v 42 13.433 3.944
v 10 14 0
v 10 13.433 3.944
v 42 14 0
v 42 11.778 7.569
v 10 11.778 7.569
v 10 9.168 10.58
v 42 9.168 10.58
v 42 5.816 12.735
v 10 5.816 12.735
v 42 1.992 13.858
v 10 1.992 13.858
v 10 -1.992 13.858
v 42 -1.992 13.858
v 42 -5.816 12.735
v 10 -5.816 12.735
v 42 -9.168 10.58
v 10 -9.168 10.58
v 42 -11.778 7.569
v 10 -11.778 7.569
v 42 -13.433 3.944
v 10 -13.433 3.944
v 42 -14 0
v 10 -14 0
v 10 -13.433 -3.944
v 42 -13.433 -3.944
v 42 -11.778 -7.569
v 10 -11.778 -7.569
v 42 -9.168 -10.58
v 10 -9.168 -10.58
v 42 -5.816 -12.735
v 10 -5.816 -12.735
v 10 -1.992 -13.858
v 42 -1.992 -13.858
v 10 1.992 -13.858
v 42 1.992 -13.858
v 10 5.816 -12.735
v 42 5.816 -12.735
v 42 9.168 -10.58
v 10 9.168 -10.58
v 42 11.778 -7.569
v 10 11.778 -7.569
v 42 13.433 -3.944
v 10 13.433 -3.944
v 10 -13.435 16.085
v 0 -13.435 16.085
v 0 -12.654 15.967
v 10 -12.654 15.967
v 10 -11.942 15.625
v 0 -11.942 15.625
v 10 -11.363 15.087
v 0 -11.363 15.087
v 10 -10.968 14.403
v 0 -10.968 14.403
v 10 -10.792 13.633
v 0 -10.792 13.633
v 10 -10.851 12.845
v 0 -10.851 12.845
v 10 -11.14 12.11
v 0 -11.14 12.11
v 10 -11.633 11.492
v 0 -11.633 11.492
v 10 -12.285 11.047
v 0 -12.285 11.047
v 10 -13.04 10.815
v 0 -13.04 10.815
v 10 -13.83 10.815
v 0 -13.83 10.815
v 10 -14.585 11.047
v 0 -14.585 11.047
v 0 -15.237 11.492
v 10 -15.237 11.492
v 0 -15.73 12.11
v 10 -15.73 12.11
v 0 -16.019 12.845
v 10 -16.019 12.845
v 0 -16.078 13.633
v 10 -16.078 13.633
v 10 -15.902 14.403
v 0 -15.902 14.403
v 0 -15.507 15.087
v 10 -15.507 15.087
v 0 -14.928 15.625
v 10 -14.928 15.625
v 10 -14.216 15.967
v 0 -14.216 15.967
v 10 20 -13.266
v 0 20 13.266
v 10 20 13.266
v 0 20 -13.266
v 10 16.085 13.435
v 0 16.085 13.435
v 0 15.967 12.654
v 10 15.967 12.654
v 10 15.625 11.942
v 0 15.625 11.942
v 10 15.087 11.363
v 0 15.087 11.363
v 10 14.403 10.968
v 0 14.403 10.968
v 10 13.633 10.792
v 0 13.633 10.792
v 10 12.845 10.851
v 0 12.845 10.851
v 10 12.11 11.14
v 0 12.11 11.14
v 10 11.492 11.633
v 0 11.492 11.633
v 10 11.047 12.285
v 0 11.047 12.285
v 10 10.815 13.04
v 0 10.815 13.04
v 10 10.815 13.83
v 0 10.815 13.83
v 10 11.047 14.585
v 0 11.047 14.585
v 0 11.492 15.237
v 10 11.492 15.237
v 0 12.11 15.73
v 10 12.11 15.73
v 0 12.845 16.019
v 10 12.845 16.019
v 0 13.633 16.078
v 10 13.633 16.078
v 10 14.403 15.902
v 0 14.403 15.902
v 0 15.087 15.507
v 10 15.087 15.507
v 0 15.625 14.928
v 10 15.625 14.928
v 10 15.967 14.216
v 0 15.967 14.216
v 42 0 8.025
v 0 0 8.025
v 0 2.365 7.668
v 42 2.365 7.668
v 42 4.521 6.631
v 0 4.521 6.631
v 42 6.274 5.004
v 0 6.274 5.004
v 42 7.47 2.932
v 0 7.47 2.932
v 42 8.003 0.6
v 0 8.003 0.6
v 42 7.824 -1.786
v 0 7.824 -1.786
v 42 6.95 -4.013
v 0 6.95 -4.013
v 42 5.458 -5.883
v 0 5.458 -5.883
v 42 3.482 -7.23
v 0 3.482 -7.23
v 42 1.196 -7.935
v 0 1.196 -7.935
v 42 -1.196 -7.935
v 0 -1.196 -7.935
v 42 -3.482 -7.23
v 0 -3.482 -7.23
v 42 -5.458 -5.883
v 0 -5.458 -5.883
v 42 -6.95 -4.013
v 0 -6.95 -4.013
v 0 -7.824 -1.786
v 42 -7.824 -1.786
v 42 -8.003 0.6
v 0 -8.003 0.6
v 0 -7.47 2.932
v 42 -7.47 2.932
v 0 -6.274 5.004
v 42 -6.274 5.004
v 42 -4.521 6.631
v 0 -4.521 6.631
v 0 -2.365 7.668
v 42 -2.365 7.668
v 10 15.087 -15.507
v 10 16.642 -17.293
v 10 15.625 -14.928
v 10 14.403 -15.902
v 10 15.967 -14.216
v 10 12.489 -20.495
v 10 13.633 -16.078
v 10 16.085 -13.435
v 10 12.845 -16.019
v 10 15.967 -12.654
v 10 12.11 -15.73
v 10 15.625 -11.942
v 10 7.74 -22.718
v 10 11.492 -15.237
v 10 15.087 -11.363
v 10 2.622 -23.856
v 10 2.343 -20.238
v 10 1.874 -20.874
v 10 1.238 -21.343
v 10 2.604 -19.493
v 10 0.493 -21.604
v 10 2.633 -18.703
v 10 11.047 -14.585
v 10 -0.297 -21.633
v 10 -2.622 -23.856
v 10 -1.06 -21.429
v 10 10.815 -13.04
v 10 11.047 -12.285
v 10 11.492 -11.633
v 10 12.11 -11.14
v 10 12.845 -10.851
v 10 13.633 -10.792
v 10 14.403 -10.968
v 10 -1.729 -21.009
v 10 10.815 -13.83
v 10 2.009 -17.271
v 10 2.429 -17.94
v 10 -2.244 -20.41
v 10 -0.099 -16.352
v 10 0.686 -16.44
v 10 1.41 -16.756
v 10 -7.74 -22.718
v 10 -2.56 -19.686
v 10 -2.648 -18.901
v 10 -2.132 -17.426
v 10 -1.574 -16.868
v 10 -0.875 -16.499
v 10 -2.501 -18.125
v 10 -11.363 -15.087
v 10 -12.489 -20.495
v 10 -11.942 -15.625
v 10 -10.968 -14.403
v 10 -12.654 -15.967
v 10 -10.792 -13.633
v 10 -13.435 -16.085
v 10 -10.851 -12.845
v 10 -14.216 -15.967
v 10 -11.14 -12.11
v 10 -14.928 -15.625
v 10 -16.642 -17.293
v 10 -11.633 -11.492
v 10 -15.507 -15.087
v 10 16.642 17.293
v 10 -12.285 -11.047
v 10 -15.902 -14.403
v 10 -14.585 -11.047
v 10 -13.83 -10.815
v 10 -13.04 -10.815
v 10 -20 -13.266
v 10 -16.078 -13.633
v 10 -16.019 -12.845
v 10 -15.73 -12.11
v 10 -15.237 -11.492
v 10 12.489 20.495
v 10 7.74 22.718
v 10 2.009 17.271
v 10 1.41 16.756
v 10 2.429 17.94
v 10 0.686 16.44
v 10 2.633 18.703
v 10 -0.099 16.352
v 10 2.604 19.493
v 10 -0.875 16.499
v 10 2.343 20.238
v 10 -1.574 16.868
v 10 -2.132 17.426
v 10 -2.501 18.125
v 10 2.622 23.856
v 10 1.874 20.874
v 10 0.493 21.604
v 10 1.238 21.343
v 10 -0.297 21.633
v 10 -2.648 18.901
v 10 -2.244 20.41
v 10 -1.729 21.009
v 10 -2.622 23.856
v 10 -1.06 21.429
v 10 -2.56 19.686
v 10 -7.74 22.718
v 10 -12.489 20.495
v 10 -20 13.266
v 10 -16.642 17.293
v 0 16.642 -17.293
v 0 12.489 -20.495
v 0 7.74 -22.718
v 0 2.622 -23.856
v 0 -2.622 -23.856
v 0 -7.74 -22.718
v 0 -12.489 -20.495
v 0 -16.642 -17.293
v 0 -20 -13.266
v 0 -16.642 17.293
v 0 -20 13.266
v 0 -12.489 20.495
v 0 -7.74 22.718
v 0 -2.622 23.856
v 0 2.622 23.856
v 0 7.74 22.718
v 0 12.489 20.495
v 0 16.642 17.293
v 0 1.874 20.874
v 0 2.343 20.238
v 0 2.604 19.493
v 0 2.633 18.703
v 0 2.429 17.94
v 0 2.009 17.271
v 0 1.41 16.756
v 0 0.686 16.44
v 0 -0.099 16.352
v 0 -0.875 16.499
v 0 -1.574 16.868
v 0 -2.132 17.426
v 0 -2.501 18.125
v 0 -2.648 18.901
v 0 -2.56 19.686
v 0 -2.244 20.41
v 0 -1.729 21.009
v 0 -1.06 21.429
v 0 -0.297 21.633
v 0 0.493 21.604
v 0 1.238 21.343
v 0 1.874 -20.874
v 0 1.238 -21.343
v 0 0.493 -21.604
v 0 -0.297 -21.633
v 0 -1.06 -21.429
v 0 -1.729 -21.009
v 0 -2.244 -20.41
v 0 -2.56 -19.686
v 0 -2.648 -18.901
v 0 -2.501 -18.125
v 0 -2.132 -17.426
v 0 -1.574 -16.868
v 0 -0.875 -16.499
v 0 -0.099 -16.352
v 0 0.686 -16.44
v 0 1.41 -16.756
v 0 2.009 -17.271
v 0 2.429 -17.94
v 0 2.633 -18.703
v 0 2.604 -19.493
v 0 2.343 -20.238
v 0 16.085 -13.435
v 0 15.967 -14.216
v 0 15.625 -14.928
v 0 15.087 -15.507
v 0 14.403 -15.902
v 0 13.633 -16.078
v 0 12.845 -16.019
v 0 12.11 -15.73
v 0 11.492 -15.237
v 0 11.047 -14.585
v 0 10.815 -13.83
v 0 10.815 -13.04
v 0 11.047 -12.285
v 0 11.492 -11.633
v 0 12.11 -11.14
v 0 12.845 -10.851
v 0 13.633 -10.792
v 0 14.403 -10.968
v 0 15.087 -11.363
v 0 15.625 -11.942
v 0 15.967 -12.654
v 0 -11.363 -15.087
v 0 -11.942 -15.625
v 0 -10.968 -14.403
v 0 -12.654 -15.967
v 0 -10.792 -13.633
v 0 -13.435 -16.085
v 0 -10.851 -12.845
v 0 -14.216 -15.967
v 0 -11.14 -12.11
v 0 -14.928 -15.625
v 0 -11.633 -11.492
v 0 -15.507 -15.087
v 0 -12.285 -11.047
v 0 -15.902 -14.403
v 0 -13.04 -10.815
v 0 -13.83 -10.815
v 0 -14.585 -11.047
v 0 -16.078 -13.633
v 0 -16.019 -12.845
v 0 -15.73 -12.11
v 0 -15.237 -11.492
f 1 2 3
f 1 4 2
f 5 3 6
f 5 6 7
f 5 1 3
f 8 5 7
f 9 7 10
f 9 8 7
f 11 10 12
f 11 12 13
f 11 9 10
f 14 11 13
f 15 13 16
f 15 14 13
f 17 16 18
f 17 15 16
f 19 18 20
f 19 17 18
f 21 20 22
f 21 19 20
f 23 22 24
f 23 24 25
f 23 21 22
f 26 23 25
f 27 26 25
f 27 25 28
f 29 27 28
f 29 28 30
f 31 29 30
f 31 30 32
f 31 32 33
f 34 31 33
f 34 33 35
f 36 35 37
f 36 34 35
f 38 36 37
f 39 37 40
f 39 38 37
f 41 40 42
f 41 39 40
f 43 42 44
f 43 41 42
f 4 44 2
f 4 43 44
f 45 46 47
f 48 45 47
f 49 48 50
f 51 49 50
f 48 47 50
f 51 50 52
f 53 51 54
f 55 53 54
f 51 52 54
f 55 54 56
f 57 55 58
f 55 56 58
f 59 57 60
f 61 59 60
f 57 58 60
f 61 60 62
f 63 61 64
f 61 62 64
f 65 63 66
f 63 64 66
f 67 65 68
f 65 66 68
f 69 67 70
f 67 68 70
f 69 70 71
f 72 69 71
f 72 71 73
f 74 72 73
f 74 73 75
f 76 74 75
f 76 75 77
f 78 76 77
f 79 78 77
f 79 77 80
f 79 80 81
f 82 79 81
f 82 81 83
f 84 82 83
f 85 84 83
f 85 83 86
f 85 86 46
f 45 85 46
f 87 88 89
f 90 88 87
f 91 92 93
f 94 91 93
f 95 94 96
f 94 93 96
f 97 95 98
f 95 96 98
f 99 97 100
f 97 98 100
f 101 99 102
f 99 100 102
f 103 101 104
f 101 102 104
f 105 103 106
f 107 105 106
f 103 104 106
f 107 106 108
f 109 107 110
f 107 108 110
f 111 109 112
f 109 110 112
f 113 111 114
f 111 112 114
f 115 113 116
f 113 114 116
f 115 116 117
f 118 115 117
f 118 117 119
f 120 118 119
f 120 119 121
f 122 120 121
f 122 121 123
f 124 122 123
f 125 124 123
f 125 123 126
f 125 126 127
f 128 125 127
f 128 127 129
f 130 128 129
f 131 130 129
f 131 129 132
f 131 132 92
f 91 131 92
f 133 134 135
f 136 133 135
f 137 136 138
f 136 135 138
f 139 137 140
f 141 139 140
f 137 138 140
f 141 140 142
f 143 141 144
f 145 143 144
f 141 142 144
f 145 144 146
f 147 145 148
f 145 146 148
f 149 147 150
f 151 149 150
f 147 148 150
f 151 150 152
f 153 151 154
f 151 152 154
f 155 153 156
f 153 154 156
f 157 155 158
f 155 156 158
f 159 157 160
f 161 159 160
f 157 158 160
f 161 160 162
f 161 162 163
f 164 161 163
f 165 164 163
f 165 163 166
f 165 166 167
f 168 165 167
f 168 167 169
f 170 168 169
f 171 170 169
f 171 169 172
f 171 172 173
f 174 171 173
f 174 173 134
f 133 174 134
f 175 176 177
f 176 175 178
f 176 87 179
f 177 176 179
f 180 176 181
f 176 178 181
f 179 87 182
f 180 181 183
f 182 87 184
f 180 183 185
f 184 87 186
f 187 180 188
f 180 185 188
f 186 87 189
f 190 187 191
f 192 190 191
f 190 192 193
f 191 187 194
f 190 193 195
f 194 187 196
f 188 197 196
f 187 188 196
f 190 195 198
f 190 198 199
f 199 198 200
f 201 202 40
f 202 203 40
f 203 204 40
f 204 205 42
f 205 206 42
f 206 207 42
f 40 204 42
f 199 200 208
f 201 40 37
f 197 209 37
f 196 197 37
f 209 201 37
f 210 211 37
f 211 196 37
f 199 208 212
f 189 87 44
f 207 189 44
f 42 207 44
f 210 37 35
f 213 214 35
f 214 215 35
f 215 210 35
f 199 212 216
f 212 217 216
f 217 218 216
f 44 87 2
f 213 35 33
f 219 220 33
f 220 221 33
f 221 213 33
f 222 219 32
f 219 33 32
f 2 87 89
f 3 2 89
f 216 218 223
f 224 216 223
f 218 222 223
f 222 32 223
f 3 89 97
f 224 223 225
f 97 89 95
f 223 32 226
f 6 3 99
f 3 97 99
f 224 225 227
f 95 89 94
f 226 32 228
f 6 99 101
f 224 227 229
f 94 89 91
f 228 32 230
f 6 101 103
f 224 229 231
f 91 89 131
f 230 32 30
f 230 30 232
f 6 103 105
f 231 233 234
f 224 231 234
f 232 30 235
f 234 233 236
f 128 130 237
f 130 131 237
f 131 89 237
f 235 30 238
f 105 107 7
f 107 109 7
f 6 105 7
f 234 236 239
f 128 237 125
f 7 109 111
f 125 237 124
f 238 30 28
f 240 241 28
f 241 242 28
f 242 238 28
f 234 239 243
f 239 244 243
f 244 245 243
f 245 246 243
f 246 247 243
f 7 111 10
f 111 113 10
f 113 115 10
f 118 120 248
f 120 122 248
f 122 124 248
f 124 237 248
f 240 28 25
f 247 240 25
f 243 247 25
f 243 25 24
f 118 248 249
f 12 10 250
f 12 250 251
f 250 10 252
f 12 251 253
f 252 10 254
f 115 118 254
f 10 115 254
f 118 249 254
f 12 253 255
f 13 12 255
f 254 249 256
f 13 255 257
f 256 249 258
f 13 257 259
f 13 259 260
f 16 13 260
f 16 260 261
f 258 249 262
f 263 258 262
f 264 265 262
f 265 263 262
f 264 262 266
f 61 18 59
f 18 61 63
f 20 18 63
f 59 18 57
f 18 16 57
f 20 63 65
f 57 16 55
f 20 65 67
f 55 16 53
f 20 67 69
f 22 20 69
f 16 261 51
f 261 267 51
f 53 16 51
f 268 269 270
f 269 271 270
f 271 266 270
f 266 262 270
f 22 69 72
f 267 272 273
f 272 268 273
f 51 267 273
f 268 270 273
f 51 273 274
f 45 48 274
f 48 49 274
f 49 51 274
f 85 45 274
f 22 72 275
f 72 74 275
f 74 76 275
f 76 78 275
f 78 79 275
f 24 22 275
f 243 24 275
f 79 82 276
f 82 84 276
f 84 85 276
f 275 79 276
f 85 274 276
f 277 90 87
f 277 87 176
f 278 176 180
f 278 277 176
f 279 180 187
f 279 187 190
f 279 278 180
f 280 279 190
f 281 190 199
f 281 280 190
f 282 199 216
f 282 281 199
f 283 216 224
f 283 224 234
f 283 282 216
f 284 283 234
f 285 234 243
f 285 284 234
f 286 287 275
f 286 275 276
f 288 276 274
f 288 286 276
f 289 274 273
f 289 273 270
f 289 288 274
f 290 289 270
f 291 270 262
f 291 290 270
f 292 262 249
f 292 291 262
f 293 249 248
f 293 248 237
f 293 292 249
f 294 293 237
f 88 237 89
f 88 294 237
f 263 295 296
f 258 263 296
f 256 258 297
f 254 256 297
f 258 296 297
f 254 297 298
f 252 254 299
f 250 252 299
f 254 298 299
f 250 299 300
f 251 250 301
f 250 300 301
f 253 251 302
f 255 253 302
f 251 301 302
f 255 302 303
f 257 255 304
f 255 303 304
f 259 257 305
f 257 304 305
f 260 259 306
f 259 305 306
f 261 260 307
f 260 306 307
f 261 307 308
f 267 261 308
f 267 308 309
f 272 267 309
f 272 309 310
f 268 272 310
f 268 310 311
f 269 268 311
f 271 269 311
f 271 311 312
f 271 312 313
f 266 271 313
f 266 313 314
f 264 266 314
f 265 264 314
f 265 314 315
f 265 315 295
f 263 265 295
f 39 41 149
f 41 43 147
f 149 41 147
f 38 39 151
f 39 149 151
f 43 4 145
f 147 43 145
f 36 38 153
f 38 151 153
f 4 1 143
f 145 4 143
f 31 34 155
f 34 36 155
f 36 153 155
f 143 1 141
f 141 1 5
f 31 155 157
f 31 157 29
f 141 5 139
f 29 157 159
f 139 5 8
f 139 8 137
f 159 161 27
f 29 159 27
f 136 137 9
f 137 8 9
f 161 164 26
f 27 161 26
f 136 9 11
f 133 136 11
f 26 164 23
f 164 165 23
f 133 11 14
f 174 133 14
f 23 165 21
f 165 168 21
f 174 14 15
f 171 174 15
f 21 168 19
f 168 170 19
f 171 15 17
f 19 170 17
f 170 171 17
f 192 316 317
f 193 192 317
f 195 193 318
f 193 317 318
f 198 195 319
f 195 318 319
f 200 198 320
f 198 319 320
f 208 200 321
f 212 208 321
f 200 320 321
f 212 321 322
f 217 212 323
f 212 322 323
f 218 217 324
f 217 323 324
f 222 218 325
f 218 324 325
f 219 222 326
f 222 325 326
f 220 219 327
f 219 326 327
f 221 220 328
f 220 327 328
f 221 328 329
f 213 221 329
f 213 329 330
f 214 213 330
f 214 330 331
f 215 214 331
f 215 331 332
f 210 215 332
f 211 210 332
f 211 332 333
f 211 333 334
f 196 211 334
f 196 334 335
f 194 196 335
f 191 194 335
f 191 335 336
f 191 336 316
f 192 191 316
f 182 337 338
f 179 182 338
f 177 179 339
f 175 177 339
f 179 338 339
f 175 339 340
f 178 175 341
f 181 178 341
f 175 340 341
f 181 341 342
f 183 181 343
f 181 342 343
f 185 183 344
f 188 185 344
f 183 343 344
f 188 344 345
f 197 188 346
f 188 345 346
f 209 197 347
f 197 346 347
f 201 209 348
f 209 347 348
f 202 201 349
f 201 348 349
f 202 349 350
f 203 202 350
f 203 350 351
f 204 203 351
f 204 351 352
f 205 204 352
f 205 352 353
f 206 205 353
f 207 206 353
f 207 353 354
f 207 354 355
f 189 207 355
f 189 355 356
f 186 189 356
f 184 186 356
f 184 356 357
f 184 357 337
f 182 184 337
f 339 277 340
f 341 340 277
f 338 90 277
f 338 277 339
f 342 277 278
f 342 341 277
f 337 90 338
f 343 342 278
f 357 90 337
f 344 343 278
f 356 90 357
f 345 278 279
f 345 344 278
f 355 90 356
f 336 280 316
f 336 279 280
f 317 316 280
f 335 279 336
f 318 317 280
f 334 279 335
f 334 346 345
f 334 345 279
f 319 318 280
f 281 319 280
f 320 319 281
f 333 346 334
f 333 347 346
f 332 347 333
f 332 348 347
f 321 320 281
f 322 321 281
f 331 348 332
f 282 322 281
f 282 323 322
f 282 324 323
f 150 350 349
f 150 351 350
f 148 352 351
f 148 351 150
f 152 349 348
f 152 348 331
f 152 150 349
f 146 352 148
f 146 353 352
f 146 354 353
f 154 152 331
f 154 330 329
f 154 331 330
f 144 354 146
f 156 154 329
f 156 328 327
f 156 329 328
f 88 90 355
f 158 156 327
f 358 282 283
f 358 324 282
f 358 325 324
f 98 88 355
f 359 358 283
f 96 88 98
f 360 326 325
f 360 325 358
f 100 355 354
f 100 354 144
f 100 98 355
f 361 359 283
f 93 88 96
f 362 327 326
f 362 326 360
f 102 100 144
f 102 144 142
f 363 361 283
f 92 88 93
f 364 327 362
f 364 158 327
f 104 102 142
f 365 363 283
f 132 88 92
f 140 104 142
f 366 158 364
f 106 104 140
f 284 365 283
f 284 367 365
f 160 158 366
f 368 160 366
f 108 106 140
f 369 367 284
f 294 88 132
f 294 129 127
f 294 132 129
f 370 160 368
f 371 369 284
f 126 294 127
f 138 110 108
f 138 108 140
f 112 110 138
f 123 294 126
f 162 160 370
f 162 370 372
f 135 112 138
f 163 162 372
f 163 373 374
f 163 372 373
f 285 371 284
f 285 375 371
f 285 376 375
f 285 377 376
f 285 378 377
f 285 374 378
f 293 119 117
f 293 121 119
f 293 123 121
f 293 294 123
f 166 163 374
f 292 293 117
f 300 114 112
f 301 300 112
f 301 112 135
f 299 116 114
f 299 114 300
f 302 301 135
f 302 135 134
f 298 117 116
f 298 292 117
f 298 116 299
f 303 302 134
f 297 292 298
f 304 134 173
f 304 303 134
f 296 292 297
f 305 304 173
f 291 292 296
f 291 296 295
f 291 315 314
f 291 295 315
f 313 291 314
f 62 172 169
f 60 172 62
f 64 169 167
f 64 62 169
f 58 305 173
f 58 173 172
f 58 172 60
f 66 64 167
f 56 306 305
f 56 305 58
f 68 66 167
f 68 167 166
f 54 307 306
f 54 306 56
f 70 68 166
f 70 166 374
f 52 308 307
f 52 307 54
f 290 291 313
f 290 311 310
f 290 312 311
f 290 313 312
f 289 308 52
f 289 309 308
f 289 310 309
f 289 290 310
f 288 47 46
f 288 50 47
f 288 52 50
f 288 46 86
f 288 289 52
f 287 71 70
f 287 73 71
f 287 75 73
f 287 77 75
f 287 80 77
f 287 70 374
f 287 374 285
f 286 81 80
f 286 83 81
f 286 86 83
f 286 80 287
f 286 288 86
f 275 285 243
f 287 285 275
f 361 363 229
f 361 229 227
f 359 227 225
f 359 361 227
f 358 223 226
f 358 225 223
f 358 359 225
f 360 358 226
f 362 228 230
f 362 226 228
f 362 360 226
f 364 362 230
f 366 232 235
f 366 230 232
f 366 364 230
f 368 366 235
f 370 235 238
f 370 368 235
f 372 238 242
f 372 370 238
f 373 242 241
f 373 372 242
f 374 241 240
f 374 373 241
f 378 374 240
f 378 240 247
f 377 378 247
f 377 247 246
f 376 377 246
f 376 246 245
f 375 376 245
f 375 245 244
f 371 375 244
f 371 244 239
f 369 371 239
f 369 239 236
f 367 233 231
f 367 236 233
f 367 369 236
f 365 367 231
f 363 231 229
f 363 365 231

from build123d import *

# Parameters (mm, degrees)
BOSS_EXTRUDE1_DEPTH  = 10
SKETCH2_W            = 32
SKETCH2_H            = 14
HOLE1_D              = 16.05
HOLE1_DEPTH          = 42
M5_CLEARANCE_HOLE1_D = 5.3
CIRPATTERN1_COUNT    = 3
CIRPATTERN1_ANGLE    = 90
MIRROR1_COPY_1_D     = 5.3
MIRROR1_COPY_2_D     = 5.3


with BuildPart() as part:
    # Sketch1 → Boss-Extrude1 (new body)
    with BuildSketch(Plane(origin=(0, 0, 0), x_dir=(0, -1, 0), z_dir=(-1, 0, 0))):
        with BuildLine():
            Line((20, -13.266499161), (20, 13.266499161))
            ThreePointArc((20, 13.266499161), (0, 24), (-20, 13.266499161))
            Line((-20, 13.266499161), (-20, -13.266499161))
            ThreePointArc((-20, -13.266499161), (0, -24), (20, -13.266499161))
        make_face()
    extrude(amount=-BOSS_EXTRUDE1_DEPTH)

    # Sketch2 → Revolve1 (revolve)
    with BuildSketch(Plane.XY):
        with Locations((26, 7)):
            Rectangle(SKETCH2_W, SKETCH2_H)
    revolve(axis=Axis((10, 0, 0), (1, 0, 0)))

    # Hole1
    with Locations(Plane(origin=(42, 0, 0), x_dir=(0, 0, -1), z_dir=(1, 0, 0))):
        with Locations((0, 0)):
            Hole(HOLE1_D / 2, depth=HOLE1_DEPTH)

    # M5 Clearance Hole1 (through all)
    with Locations(Plane(origin=(10, 0, 0), x_dir=(0, 0, -1), z_dir=(1, 0, 0))):
        with Locations((-13.435028843, -13.435028843)):
            m5_clearance_hole1 = Hole(M5_CLEARANCE_HOLE1_D / 2)

    # CirPattern1: M5 Clearance Hole1 ×3 about axis
    cirpattern1_axis = Axis((0, 0, 0), (-1, 0, 0))
    for i in range(1, CIRPATTERN1_COUNT):
        add(m5_clearance_hole1.rotate(cirpattern1_axis, i * CIRPATTERN1_ANGLE / (CIRPATTERN1_COUNT - 1)), mode=Mode.SUBTRACT)

    # Mirror1: M5 Clearance Hole1 across plane
    add(m5_clearance_hole1.mirror(Plane.XY), mode=Mode.SUBTRACT)

    # Mirror1 copy 1 (through all)
    with Locations(Plane(origin=(10, 0, 0), x_dir=(0, -0.707106781, 0.707106781), z_dir=(1, 0, 0))):
        with Locations((-13.435028843, 13.435028843)):
            Hole(MIRROR1_COPY_1_D / 2)

    # Mirror1 copy 2 (through all)
    with Locations(Plane(origin=(10, 0, 0), x_dir=(0, -1, 0), z_dir=(1, 0, 0))):
        with Locations((-13.435028843, 13.435028843)):
            Hole(MIRROR1_COPY_2_D / 2)


solid = part.part
